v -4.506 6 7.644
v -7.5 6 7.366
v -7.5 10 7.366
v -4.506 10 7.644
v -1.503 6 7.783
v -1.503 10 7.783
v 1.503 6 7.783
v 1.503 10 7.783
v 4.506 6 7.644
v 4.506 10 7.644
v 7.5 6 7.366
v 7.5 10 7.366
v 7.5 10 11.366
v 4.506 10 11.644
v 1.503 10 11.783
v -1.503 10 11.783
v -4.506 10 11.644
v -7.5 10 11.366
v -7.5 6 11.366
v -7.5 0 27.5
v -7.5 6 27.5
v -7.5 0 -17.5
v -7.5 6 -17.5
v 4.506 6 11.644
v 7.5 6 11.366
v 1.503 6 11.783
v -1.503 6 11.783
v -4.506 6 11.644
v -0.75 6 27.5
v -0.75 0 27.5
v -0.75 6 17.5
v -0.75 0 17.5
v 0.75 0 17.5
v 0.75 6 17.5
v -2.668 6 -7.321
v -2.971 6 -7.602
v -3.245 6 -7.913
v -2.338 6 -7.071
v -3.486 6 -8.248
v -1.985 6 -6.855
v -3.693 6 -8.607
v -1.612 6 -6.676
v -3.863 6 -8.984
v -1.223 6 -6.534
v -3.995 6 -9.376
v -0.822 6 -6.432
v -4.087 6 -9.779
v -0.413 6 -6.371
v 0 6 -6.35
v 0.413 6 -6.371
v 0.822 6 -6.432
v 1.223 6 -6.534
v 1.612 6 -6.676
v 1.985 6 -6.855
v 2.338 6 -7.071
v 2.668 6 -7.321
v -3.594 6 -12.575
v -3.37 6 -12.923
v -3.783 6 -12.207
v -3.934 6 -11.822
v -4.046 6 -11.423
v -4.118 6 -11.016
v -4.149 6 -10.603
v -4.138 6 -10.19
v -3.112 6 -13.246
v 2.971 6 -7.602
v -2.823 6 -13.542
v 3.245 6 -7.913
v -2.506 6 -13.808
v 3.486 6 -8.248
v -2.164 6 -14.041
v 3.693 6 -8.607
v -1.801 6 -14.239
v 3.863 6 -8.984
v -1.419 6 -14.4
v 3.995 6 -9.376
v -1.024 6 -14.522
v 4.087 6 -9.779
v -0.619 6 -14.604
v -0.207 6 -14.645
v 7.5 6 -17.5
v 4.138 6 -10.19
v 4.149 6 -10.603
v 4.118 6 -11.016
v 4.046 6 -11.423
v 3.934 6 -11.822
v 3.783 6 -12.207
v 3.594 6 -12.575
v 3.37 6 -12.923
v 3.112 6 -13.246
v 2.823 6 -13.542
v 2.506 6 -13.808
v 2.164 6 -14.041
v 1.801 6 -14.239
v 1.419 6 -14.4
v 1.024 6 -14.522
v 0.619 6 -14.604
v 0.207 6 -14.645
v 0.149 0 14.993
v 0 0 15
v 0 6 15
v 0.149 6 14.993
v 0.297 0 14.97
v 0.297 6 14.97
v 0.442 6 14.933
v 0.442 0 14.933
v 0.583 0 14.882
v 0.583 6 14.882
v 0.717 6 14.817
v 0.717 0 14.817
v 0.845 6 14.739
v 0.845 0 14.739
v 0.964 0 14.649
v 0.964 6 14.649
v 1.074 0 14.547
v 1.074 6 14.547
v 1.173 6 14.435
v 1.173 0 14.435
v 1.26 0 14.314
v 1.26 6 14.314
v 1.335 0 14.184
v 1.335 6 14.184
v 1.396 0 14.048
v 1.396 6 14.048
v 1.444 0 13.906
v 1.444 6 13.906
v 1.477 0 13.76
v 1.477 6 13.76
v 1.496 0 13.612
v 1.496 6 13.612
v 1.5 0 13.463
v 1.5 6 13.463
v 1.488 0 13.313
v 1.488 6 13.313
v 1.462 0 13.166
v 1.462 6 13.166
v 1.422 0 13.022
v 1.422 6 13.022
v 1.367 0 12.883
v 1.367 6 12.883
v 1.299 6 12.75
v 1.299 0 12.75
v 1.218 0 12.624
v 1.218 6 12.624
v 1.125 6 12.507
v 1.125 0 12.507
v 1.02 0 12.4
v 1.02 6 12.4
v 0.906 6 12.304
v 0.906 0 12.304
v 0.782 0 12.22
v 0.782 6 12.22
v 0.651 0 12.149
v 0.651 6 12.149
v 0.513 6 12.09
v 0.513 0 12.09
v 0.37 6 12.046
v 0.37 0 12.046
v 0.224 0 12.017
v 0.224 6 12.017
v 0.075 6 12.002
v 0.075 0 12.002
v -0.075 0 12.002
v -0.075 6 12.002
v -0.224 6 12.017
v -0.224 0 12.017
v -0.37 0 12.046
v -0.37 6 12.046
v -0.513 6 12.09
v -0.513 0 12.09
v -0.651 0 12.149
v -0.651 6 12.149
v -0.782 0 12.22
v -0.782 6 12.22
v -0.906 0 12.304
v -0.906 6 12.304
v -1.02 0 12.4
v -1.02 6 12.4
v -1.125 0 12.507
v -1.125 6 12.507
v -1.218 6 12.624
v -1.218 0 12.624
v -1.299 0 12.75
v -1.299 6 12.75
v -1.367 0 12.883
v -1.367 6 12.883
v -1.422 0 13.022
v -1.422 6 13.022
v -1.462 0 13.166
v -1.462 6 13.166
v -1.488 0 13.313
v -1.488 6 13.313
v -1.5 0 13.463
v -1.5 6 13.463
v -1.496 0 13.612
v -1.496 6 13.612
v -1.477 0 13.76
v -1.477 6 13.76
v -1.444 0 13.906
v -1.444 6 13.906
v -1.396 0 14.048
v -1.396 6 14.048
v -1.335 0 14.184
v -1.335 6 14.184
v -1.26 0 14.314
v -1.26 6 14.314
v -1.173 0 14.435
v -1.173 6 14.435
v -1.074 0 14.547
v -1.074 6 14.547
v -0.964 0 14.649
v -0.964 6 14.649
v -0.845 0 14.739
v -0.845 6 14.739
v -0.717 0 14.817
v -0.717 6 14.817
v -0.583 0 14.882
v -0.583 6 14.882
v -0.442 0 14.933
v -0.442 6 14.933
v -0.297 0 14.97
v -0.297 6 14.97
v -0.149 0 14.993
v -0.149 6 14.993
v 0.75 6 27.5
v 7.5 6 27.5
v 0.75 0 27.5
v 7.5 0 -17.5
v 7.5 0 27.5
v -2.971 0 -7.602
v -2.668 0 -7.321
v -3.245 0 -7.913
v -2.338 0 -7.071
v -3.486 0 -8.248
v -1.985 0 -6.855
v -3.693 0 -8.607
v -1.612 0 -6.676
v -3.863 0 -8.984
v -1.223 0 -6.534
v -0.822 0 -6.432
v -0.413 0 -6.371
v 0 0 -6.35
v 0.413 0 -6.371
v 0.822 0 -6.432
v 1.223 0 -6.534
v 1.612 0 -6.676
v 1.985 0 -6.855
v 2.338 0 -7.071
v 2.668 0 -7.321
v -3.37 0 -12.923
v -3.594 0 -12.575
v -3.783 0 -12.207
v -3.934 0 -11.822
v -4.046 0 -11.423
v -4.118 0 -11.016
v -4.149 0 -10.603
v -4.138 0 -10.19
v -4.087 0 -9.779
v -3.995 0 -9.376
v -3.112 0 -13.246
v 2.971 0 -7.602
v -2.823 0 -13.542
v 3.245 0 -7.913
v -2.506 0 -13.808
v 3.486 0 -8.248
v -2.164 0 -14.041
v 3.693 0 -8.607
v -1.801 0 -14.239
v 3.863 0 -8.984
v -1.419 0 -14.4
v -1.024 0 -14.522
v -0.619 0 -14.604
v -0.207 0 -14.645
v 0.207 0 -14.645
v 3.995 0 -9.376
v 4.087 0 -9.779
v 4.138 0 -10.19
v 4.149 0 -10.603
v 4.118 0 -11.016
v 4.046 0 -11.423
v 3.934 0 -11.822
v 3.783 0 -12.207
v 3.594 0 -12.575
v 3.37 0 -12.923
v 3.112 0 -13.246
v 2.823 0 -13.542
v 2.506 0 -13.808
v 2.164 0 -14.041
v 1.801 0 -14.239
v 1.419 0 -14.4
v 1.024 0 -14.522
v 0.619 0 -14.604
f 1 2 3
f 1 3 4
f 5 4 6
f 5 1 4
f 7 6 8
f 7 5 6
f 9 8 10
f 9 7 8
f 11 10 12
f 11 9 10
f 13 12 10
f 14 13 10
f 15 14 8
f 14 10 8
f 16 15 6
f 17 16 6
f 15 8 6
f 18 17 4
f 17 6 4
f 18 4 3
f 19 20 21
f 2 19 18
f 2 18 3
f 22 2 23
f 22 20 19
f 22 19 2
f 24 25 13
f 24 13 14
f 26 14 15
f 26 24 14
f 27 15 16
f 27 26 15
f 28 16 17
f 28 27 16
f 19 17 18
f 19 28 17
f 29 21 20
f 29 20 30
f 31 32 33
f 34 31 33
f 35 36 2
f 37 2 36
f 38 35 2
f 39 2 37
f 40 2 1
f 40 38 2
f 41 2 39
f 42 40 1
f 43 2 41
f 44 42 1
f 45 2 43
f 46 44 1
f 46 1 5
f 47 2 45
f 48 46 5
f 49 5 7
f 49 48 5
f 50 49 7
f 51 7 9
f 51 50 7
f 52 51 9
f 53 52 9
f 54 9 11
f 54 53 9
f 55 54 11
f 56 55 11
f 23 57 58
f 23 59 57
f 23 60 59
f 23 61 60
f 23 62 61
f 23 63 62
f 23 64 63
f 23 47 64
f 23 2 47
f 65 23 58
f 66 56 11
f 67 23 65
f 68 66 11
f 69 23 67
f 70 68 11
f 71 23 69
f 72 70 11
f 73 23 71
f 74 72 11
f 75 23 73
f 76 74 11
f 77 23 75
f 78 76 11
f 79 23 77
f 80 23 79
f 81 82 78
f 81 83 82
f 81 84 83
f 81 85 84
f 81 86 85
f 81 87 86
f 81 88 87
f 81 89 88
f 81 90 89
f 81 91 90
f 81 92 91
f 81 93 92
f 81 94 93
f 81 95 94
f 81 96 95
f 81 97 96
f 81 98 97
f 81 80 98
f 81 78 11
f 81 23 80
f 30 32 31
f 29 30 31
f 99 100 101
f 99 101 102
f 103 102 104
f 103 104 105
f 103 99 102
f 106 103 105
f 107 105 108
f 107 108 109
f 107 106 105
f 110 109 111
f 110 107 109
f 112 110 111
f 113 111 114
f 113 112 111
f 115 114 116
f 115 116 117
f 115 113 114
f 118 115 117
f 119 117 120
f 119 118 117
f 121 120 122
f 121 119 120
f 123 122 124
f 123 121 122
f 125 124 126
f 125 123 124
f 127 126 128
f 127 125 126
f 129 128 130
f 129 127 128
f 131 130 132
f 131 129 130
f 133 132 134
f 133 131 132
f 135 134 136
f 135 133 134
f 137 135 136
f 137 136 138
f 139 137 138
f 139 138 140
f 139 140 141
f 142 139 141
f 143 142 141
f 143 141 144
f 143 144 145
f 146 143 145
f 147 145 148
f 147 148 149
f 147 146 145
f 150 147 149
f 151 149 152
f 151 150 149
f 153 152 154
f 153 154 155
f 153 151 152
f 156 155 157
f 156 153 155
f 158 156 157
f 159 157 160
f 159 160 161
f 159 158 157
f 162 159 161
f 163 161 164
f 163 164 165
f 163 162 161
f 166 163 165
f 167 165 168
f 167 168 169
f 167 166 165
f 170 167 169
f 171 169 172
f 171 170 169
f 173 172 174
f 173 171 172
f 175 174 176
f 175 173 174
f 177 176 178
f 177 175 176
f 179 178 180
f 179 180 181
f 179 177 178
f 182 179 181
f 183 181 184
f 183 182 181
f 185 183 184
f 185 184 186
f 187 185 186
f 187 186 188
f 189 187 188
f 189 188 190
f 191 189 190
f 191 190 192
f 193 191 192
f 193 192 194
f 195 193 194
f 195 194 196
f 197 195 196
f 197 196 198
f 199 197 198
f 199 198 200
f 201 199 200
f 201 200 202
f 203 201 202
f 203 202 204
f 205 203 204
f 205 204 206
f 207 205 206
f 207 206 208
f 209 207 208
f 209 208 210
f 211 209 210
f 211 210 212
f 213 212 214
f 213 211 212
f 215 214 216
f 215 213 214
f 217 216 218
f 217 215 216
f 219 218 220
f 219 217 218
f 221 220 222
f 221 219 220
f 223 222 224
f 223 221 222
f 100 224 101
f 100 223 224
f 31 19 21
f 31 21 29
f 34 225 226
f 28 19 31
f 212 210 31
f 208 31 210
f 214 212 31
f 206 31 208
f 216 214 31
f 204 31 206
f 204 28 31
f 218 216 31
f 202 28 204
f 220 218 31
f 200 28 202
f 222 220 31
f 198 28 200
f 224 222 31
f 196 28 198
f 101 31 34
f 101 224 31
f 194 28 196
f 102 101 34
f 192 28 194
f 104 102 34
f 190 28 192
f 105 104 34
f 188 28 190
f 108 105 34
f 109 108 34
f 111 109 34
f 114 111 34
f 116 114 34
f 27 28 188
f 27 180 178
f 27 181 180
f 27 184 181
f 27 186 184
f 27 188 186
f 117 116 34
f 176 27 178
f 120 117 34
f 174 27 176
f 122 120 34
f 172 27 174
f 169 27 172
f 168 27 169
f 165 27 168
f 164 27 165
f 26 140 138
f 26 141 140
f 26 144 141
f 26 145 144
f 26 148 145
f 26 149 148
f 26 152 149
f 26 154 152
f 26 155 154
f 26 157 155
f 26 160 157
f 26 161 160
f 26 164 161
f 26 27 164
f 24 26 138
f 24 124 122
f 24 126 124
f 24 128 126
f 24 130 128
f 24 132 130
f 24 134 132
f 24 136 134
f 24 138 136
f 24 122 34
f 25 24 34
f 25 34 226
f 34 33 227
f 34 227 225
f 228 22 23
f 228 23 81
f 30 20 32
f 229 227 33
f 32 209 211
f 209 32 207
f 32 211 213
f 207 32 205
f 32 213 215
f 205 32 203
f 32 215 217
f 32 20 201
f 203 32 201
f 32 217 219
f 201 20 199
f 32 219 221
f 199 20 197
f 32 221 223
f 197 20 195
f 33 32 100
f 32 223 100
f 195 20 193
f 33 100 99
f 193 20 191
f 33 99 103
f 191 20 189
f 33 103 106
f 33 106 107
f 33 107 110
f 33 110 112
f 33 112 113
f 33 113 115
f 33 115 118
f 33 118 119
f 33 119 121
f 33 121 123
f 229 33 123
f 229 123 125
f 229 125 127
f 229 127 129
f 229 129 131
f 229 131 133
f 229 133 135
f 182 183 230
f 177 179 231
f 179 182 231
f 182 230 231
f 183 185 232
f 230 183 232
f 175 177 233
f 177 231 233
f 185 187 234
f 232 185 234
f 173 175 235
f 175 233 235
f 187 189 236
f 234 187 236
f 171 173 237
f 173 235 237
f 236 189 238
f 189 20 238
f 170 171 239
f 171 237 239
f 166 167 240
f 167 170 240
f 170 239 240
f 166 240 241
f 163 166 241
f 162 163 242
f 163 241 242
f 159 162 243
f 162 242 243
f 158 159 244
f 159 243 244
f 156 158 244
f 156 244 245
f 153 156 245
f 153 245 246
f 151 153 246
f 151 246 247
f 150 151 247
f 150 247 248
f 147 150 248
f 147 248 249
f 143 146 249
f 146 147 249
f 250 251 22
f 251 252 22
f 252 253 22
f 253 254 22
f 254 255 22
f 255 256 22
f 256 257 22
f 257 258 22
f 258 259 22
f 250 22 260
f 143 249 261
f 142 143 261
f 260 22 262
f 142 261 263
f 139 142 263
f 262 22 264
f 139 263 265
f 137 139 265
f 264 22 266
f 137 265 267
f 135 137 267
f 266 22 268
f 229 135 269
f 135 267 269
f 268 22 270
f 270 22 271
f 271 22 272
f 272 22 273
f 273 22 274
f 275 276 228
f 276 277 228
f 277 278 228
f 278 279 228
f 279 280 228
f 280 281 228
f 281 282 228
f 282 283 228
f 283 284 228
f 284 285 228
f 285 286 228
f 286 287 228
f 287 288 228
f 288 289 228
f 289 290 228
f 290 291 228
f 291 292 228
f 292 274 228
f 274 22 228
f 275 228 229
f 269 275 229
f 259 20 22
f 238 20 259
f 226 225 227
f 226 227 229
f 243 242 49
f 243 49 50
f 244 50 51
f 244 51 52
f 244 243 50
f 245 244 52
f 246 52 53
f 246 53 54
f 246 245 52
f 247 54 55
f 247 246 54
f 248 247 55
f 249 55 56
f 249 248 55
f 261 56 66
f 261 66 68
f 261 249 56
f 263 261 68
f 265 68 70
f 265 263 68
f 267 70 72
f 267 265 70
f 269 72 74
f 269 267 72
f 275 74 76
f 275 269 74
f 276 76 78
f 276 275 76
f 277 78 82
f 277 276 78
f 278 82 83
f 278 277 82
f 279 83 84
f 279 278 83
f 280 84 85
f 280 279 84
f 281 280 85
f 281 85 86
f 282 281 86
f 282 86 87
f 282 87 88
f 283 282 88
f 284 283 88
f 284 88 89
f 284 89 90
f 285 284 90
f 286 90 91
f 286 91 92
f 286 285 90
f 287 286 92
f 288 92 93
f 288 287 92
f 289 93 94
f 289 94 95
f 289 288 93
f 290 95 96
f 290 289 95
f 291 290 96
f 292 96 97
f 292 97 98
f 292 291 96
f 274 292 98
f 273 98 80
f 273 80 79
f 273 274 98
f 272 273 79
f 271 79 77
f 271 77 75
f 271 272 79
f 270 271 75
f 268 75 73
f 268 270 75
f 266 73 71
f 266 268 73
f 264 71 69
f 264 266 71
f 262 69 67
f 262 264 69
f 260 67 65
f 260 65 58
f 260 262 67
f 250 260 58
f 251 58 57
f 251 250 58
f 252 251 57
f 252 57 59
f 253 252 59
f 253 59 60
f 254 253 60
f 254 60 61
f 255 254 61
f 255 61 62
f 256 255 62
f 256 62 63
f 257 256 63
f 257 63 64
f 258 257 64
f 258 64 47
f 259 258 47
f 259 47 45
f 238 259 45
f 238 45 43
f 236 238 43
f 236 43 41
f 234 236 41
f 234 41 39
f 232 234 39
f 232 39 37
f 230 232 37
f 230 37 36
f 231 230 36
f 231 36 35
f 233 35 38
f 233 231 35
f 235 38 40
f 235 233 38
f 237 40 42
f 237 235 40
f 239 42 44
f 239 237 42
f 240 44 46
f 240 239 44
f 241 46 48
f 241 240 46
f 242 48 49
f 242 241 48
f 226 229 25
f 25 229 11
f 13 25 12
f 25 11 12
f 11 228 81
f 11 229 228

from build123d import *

# Parameters (mm, degrees)
SKETCH1_W           = 15
SKETCH1_H           = 35
SKETCH1_R           = 4.15
SKETCH1_R_2         = 1.5
BOSS_EXTRUDE1_DEPTH = 6
BOSS_EXTRUDE2_DEPTH = 4
SKETCH3_W           = 6.75
SKETCH3_H           = 6
BOSS_EXTRUDE3_DEPTH = 10


with BuildPart() as part:
    # Sketch1 → Boss-Extrude1 (new body)
    with BuildSketch(Plane(origin=(0, 0, 0), x_dir=(1, 0, 0), z_dir=(0, 1, 0))):
        Rectangle(SKETCH1_W, SKETCH1_H)
        with Locations(Location((0, 10.5, 0), (0, 0, 270))):  # turned: the seam where the file's is
            Circle(SKETCH1_R, mode=Mode.SUBTRACT)
        with Locations(Location((0, -13.5, 0), (0, 0, 270))):  # turned: the seam where the file's is
            Circle(SKETCH1_R_2, mode=Mode.SUBTRACT)
    extrude(amount=BOSS_EXTRUDE1_DEPTH)

    # Sketch2 → Boss-Extrude2 (add)
    with BuildSketch(Plane(origin=(0, 6, 0), x_dir=(1, 0, 0), z_dir=(0, 1, 0))):
        with BuildLine():
            Line((-7.5, -11.365857851), (-7.5, -7.365857851))
            ThreePointArc((-7.5, -7.365857851), (0, -7.8), (7.5, -7.365857851))
            Line((7.5, -7.365857851), (7.5, -11.365857851))
            ThreePointArc((7.5, -11.365857851), (0, -11.8), (-7.5, -11.365857851))
        make_face()
    extrude(amount=BOSS_EXTRUDE2_DEPTH)

    # Sketch3 → Boss-Extrude3 (add)
    with BuildSketch(Plane.XY.offset(17.5)):
        with Locations((4.125, 3)):
            Rectangle(SKETCH3_W, SKETCH3_H)
        with Locations((-4.125, 3)):
            Rectangle(SKETCH3_W, SKETCH3_H)
    extrude(amount=BOSS_EXTRUDE3_DEPTH)


solid = part.part
